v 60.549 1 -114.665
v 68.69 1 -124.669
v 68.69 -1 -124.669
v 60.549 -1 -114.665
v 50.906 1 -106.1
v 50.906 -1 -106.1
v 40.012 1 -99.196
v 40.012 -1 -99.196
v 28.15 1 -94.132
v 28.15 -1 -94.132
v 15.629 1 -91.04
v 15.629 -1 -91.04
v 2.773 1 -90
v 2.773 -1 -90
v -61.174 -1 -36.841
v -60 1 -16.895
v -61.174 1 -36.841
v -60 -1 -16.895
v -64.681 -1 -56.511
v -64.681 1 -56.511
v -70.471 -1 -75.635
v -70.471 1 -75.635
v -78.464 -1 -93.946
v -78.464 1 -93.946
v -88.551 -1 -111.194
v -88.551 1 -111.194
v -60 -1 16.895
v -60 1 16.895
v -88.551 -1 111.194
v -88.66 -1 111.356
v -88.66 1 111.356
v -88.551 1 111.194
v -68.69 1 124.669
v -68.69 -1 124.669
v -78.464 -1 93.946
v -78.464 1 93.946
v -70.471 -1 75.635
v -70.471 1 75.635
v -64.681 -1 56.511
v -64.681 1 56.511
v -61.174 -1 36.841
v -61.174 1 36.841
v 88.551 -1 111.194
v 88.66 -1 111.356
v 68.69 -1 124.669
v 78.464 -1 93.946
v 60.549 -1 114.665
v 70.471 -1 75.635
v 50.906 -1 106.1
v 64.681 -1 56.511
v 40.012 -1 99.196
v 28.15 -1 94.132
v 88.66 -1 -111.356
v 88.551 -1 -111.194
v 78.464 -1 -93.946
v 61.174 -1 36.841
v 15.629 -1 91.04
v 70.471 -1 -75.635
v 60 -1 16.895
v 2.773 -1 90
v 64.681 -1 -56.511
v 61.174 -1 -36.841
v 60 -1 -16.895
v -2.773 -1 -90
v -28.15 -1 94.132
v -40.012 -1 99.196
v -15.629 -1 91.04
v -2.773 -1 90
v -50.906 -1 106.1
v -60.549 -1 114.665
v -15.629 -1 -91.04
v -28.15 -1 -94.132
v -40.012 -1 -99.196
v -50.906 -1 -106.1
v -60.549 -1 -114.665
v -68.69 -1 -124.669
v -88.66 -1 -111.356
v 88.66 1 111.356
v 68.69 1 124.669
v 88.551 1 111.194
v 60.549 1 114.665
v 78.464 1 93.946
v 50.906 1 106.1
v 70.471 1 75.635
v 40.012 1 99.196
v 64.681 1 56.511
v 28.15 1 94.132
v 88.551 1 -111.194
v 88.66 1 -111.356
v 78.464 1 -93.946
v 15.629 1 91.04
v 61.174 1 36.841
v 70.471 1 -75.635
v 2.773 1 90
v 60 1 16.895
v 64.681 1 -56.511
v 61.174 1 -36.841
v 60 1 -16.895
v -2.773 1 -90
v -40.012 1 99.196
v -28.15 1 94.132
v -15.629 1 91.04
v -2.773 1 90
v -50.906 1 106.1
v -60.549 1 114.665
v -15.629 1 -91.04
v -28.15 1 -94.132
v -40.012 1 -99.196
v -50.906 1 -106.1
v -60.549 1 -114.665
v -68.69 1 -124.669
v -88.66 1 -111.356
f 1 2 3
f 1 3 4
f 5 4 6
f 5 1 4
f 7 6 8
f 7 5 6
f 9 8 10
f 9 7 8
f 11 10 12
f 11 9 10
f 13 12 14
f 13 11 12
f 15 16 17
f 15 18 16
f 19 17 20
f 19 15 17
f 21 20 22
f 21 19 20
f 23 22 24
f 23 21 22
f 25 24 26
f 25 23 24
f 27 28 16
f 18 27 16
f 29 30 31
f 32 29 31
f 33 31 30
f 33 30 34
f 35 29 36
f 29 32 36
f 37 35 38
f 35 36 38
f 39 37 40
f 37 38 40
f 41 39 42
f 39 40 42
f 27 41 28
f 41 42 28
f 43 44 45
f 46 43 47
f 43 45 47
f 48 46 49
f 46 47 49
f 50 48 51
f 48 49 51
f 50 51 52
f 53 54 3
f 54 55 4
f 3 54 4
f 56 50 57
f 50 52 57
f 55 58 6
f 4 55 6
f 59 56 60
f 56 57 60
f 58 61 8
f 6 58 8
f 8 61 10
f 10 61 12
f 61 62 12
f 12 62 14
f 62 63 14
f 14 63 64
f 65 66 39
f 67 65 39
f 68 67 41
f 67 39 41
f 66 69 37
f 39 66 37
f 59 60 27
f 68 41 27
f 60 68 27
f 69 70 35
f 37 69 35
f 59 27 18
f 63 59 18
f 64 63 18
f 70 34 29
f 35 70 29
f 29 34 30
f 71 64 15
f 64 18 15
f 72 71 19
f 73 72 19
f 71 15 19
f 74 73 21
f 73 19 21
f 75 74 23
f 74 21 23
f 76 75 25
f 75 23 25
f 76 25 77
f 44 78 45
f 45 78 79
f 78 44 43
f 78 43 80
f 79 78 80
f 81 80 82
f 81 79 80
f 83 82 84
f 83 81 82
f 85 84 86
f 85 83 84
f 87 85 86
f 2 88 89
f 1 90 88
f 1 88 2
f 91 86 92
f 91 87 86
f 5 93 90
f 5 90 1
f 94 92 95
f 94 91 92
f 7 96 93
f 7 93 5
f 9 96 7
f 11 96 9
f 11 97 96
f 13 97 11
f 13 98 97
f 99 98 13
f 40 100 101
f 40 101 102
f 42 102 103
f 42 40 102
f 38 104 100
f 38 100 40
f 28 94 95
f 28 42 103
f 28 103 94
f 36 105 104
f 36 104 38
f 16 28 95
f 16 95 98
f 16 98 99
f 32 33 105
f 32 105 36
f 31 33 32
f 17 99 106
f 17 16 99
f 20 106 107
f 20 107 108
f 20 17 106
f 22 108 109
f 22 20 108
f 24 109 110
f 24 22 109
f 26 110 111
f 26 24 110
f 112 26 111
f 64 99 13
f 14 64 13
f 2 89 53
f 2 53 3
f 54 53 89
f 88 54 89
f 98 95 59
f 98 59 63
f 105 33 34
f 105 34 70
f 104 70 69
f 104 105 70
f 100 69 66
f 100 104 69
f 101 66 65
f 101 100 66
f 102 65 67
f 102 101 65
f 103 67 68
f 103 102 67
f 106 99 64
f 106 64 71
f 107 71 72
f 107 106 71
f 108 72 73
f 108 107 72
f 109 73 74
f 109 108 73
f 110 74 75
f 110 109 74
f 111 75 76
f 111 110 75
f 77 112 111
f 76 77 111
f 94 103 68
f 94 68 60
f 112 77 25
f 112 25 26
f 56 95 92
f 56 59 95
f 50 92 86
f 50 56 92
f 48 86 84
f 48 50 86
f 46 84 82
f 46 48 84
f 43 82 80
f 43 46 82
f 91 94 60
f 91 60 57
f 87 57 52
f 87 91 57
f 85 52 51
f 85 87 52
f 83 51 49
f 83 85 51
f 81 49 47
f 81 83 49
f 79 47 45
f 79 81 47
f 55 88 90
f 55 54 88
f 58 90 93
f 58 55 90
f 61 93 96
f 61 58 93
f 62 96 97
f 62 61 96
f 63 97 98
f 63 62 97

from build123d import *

# Parameters (mm, degrees)
IZIM1_W                     = 120
IZIM1_H                     = 180
Y_KSEKLIK_EKSTR_ZYON1_DEPTH = 1
Y_KSEKLIK_EKSTR_ZYON3_REACH = 252.002
IZIM4_W                     = 24
IZIM4_H                     = 2
AYNALAMA2_COPY_1_REACH      = 252.002
AYNALAMA2_COPY_1_SKETCH_W   = 24
AYNALAMA2_COPY_1_SKETCH_H   = 2
RADYUS3_R                   = 80
RADYUS4_R                   = 80
RADYUS5_R                   = 170
RADYUS6_R                   = 170


with BuildPart() as part:
    # Çizim1 → Yükseklik-Ekstrüzyon1 (new, symmetric)
    with BuildSketch(Plane(origin=(0, 0, 0), x_dir=(1, 0, 0), z_dir=(0, 1, 0))):
        Rectangle(IZIM1_W, IZIM1_H)
    extrude(amount=Y_KSEKLIK_EKSTR_ZYON1_DEPTH, both=True)

    # Çizim4 → Yükseklik-Ekstrüzyon3 (add, up to next)
    with BuildSketch(Plane(origin=(78.675049056, 0, -118.012573584), x_dir=(-0.8320502943378438, 0, -0.5547001962252289), z_dir=(0.5547001962252289, 0, -0.8320502943378438)), mode=Mode.PRIVATE) as y_kseklik_ekstr_zyon3_sk1:
        Rectangle(IZIM4_W, IZIM4_H)
    y_kseklik_ekstr_zyon3_tool1 = extrude(y_kseklik_ekstr_zyon3_sk1.sketch, amount=-Y_KSEKLIK_EKSTR_ZYON3_REACH, mode=Mode.PRIVATE) - part.part
    y_kseklik_ekstr_zyon3 = y_kseklik_ekstr_zyon3_tool1.solids().sort_by_distance((78.675049, 0, -118.012574))[0]
    add(y_kseklik_ekstr_zyon3)

    # Aynalama1: Yükseklik-Ekstrüzyon3 across plane
    add(y_kseklik_ekstr_zyon3.mirror(Plane(origin=(0, 0, 0), x_dir=(0, 0, 1), z_dir=(1, 0, 0))))

    # Aynalama2: Yükseklik-Ekstrüzyon3 across plane
    add(y_kseklik_ekstr_zyon3.mirror(Plane.XY))

    # Aynalama2 copy 1 sketch → Aynalama2 copy 1 (add, up to next)
    with BuildSketch(Plane(origin=(-78.675049056, 0, 118.012573584), x_dir=(0.8320502943378438, 0, 0.5547001962252289), z_dir=(-0.5547001962252289, 0, 0.8320502943378438)), mode=Mode.PRIVATE) as aynalama2_copy_1_sk1:
        Rectangle(AYNALAMA2_COPY_1_SKETCH_W, AYNALAMA2_COPY_1_SKETCH_H)
    aynalama2_copy_1_tool1 = extrude(aynalama2_copy_1_sk1.sketch, amount=-AYNALAMA2_COPY_1_REACH, mode=Mode.PRIVATE) - part.part
    add(aynalama2_copy_1_tool1.solids().sort_by_distance((-78.675049, 0, 118.012574))[0])

    # Radyus3
    # the kernel refuses this fillet: 80 mm, written as the material it adds along each edge
    with BuildSketch(Plane(origin=(45.577794898, 1, -90), x_dir=(-1, 0, 0), z_dir=(0, -1, 0))) as radyus3_piece_1:
        with BuildLine():
            CenterArc((42.804708678, 80), RADYUS3_R, 214.516100583, 55.483899417)
            Line((-23.112650626, 34.668975939), (-24.430997812, 33.762355458))
            ThreePointArc((-24.430997812, 33.762355458), (-12.887605784, 16.446967656), (-1.331280471, -0.887520314))
            Line((-1.331280471, -0.887520314), (0, -1.6))
            Line((0, -1.6), (42.804708678, -1.6))
            Line((42.804708678, -1.6), (42.804708678, 0))
        make_face()
    extrude(amount=2)
    with BuildSketch(Plane(origin=(-45.577794898, 1, -90), x_dir=(-0.5547001962252296, 0, -0.8320502943378434), z_dir=(0, -1, 0))) as radyus3_piece_2:
        with BuildLine():
            CenterArc((42.820243244, 79.991686152), RADYUS3_R, 213.690067526, 55.483899417)
            Line((-23.743780303, 35.615670454), (-25.075060774, 34.72815014))
            Line((-25.075060774, 34.72815014), (-1.331280471, -0.887520314))
            Line((-1.331280471, -0.887520314), (0, -1.6))
            ThreePointArc((0, -1.6), (20.833461736, -1.6), (41.643857077, -1.599833723))
            Line((41.643857077, -1.599833723), (41.666923472, 0))
        make_face()
    extrude(amount=2)

    # Radyus4
    # the kernel refuses this fillet: 80 mm, written as the material it adds along each edge
    with BuildSketch(Plane(origin=(-45.577794898, 1, 90), x_dir=(1, 0, 0), z_dir=(0, -1, 0))) as radyus4_piece_1:
        with BuildLine():
            CenterArc((42.804708678, 80), RADYUS4_R, 214.516100583, 55.483899417)
            Line((-23.112650626, 34.668975939), (-24.430997812, 33.762355458))
            ThreePointArc((-24.430997812, 33.762355458), (-12.887605784, 16.446967656), (-1.331280471, -0.887520314))
            Line((-1.331280471, -0.887520314), (0, -1.6))
            Line((0, -1.6), (42.804708678, -1.6))
            Line((42.804708678, -1.6), (42.804708678, 0))
        make_face()
    extrude(amount=2)
    with BuildSketch(Plane(origin=(45.577794898, 1, 90), x_dir=(0.5547001962252287, 0, 0.8320502943378439), z_dir=(0, -1, 0))) as radyus4_piece_2:
        with BuildLine():
            CenterArc((42.820243244, 79.991686152), RADYUS4_R, 213.690067526, 55.483899417)
            Line((-23.743780303, 35.615670454), (-25.075060774, 34.72815014))
            Line((-25.075060774, 34.72815014), (-1.331280471, -0.887520314))
            Line((-1.331280471, -0.887520314), (0, -1.6))
            ThreePointArc((0, -1.6), (20.833461736, -1.6), (41.643857077, -1.599833723))
            Line((41.643857077, -1.599833723), (41.666923472, 0))
        make_face()
    extrude(amount=2)

    # Radyus5
    radyus5_edges = [part.edges().sort_by_distance(p)[0] for p in [
        (-60, 0, -68.366692347),
        (-60, 0, 68.366692347),
    ]]
    fillet(radyus5_edges, radius=RADYUS5_R)

    # Radyus6
    radyus6_edges = [part.edges().sort_by_distance(p)[0] for p in [
        (60, 0, -68.366692347),
        (60, 0, 68.366692347),
    ]]
    fillet(radyus6_edges, radius=RADYUS6_R)


solid = part.part
